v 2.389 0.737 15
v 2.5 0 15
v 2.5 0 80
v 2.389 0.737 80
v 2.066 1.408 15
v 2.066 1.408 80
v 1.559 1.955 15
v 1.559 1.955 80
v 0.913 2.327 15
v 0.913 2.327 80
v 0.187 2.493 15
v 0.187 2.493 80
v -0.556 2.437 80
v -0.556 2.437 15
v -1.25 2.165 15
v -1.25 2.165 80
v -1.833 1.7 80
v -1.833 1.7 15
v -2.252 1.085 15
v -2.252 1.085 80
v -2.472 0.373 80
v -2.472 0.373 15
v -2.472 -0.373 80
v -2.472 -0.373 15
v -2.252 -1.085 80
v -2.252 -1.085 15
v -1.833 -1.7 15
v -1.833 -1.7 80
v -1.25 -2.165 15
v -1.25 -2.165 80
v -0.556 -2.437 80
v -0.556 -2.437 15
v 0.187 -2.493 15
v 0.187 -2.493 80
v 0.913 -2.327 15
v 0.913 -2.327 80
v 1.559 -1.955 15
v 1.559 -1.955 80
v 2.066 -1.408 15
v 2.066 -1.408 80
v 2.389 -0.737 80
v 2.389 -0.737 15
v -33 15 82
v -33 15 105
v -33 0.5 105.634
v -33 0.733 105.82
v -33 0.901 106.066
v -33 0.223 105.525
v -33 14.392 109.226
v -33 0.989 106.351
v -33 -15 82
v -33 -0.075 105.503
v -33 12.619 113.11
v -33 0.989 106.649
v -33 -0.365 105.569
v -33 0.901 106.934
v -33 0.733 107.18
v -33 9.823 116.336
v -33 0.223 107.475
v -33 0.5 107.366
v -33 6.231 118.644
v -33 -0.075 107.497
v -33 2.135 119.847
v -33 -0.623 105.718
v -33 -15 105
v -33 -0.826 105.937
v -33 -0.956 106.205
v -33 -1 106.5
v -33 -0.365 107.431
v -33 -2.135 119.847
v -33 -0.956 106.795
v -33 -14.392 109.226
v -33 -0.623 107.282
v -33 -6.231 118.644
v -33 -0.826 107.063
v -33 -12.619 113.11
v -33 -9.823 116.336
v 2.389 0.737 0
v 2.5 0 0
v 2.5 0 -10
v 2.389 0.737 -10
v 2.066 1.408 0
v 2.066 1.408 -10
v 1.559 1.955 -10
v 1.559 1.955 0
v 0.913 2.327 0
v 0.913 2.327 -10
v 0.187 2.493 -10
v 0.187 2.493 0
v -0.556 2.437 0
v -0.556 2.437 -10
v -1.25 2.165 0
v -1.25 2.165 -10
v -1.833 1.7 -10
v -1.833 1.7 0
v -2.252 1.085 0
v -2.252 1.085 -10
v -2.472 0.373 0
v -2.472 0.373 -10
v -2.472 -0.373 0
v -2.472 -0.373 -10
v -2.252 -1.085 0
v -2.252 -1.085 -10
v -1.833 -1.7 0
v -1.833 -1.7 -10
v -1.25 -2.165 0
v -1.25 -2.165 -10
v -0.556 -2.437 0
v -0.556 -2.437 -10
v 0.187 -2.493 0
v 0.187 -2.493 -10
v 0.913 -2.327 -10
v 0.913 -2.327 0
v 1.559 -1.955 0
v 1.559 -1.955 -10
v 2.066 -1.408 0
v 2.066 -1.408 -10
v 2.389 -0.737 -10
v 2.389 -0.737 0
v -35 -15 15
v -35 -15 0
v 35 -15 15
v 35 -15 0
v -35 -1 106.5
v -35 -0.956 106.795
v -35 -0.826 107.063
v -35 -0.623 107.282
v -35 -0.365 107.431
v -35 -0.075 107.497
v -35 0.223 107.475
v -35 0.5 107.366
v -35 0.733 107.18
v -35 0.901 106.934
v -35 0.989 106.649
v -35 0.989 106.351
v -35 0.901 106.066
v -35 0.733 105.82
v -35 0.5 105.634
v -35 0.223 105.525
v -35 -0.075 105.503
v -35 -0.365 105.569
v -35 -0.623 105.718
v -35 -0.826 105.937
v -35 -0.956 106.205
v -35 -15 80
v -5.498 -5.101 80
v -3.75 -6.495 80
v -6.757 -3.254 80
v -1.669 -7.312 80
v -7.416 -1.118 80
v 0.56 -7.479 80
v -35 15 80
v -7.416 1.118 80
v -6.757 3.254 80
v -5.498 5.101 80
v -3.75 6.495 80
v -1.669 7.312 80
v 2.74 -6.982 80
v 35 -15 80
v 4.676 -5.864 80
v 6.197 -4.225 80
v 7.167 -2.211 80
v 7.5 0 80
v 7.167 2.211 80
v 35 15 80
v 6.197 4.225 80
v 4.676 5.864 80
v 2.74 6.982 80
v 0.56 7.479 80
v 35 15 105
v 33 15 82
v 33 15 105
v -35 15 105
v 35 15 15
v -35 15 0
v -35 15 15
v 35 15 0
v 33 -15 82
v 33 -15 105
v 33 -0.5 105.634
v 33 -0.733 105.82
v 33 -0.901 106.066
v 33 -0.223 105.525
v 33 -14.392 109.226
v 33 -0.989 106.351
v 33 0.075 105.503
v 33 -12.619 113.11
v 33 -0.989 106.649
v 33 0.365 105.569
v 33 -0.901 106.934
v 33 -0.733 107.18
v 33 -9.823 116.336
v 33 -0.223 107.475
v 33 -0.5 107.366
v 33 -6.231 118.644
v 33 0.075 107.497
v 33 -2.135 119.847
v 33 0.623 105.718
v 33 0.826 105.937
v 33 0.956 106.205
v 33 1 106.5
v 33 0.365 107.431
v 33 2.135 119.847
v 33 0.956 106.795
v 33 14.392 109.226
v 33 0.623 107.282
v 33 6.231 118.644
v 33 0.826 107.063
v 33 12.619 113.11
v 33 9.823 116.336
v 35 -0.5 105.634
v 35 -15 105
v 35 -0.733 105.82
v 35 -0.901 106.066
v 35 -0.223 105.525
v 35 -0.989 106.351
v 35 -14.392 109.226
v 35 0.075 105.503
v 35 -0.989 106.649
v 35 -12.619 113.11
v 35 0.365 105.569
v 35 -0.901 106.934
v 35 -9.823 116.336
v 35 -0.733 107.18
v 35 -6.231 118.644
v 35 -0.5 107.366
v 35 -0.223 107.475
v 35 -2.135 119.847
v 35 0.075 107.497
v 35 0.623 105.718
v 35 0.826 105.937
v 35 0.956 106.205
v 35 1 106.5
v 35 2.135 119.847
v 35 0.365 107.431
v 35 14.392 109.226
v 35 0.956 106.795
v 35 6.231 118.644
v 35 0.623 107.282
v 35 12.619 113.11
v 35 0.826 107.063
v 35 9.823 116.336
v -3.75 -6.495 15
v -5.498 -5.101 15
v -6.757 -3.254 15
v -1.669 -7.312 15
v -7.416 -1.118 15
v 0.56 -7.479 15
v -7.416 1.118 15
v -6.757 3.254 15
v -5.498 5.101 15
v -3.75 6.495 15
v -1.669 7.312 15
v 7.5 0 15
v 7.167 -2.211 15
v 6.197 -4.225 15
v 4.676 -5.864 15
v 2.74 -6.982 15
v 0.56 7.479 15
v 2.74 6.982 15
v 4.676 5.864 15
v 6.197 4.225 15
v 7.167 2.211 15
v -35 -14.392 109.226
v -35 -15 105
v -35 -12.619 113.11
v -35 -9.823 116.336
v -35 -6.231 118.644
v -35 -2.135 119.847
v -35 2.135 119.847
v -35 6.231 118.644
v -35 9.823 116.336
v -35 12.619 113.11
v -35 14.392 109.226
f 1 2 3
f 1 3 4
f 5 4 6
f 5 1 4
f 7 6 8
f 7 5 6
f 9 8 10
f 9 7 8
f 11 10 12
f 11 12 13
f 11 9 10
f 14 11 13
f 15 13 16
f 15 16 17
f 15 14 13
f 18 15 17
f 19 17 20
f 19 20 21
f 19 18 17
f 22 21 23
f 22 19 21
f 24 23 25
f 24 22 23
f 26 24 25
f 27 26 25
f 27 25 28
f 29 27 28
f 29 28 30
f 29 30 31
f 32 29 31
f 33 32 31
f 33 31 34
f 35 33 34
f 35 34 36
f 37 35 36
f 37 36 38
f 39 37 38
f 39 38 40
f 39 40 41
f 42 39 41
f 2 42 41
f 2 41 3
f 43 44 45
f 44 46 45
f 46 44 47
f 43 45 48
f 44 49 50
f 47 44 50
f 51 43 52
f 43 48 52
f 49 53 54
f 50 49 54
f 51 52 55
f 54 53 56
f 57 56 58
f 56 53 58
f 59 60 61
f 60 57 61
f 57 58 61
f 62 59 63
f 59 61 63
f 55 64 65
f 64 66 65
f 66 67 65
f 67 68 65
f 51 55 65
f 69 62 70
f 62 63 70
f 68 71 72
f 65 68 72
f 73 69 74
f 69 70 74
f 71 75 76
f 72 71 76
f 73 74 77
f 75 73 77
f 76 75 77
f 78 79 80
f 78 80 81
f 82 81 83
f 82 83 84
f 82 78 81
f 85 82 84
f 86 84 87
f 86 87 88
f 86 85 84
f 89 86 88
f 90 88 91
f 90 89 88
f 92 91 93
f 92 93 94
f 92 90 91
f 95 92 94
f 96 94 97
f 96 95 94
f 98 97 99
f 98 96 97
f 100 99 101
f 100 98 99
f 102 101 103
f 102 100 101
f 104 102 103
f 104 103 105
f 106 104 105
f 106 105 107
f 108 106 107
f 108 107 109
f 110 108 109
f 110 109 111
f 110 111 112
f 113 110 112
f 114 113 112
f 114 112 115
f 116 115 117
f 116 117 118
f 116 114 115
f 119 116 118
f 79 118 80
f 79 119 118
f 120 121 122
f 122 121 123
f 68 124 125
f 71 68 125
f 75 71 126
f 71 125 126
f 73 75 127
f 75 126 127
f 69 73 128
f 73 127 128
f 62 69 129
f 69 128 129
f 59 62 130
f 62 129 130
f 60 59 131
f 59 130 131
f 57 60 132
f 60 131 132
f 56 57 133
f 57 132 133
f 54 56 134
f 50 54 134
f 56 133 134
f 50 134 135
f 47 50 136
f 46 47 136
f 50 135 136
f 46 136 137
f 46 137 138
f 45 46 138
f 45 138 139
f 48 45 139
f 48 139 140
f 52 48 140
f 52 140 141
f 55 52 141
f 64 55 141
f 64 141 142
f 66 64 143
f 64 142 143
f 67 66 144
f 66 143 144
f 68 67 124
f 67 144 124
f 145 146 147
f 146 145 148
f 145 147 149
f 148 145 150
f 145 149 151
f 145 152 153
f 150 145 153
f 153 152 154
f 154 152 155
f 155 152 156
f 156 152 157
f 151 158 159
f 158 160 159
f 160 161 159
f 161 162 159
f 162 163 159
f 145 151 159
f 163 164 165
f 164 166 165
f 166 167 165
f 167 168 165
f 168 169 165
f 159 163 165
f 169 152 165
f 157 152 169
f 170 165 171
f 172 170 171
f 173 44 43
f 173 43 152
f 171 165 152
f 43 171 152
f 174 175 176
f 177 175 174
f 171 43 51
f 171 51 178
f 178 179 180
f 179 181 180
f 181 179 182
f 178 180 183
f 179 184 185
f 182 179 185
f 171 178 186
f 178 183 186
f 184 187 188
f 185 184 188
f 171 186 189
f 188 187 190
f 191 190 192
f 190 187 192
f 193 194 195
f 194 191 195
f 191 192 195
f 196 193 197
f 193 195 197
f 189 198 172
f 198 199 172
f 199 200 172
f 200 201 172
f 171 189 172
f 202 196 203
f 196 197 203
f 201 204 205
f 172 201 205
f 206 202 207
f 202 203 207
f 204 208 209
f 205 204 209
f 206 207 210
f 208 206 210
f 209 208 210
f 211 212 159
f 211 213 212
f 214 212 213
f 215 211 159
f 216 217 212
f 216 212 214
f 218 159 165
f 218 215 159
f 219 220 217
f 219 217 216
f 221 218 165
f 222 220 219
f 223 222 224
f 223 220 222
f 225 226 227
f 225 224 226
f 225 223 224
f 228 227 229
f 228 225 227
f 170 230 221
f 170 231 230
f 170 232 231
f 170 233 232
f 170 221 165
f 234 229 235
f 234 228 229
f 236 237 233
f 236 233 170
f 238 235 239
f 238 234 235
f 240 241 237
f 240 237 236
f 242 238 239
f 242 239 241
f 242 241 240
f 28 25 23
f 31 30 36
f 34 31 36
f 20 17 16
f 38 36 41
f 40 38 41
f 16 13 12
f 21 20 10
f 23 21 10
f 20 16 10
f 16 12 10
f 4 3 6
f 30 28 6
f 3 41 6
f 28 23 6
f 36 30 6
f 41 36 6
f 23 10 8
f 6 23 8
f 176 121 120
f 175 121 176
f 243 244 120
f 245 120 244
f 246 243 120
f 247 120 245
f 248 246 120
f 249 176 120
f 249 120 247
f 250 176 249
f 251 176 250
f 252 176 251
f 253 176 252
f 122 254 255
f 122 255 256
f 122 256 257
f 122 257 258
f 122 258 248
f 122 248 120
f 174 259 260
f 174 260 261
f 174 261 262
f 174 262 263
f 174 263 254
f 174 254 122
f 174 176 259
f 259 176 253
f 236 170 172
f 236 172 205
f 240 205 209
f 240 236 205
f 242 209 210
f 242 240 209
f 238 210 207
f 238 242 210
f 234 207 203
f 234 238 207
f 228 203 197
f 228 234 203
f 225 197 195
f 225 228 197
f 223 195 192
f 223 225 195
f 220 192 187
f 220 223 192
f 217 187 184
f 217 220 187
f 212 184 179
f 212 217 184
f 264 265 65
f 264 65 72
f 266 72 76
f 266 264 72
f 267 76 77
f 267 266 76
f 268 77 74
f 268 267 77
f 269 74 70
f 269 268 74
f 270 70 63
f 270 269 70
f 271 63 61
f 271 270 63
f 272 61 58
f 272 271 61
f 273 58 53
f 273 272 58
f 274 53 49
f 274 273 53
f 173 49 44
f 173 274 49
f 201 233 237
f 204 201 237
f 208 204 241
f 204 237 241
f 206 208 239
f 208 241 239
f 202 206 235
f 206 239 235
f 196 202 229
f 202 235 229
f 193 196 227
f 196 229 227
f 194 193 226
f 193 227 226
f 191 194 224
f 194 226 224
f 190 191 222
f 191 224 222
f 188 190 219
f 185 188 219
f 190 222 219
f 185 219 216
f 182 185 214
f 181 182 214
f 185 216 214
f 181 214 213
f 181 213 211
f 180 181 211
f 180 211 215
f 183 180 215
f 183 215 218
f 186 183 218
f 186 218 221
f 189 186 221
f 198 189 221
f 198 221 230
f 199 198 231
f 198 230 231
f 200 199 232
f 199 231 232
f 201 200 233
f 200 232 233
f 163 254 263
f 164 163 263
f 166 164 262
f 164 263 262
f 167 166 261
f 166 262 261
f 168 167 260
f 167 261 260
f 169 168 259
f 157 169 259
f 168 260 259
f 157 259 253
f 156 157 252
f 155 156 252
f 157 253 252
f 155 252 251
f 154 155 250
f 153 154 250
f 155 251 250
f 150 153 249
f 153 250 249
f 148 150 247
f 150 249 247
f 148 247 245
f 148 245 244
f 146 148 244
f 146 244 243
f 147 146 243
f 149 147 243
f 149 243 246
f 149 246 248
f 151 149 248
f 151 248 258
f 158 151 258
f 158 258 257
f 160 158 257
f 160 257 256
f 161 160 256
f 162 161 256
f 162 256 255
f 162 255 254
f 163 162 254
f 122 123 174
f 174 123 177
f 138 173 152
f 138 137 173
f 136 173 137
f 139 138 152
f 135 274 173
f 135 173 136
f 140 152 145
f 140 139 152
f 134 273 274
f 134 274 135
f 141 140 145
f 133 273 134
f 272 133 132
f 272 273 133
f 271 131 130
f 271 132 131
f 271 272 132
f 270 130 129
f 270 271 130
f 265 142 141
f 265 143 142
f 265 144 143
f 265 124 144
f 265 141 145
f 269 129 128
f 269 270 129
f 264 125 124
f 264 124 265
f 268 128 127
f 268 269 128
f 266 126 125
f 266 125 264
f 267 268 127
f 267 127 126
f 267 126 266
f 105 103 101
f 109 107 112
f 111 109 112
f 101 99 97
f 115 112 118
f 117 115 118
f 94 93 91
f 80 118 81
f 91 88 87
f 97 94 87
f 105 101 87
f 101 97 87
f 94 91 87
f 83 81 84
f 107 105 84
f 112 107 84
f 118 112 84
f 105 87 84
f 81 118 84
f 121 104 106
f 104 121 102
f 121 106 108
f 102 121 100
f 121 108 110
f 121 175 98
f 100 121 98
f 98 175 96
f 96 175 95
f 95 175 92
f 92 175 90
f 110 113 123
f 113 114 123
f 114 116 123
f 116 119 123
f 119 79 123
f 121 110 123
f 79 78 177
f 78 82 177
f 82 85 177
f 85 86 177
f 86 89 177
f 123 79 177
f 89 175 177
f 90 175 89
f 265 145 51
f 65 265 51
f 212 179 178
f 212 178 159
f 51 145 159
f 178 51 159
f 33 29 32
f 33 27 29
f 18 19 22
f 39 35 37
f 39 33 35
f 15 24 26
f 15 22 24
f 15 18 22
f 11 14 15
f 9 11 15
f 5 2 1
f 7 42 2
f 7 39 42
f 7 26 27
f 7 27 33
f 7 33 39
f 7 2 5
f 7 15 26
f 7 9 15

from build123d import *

# Parameters (mm, degrees)
F0_W      = 70
F0_H      = 30
F0_R      = 7.5
F0_R_2    = 2.5
F1_DEPTH  = 15
F2_DEPTH  = 10
F3_DEPTH  = 80
F4_W      = 66
F4_H      = 30
F4_R      = 7.5
F4_R_2    = 2.5
F4_W_2    = 2
F5_DEPTH  = 2
F6_DEPTH  = 25
F7_R      = 1
F8_DEPTH  = 2
F9_R      = 1
F10_DEPTH = 2


with BuildPart() as f1:
    # F0 (on Top) → F1 (new body)
    with BuildSketch(Plane.XY):
        Rectangle(F0_W, F0_H)
        Circle(F0_R, mode=Mode.SUBTRACT)
        Circle(F0_R)
        Circle(F0_R_2, mode=Mode.SUBTRACT)
        Circle(F0_R_2)
    extrude(amount=F1_DEPTH)

    # F0 (on Top) → F2 (join)
    with BuildSketch(Plane.XY):
        Circle(F0_R_2)
    extrude(amount=-F2_DEPTH)

    # F0 (on Top) → F3 (join)
    with BuildSketch(Plane.XY):
        Circle(F0_R)
        Circle(F0_R_2, mode=Mode.SUBTRACT)
    extrude(amount=F3_DEPTH)

    # F4 (on face) → F5 (join)
    with BuildSketch(Plane.XY.offset(80)):
        Rectangle(F4_W, F4_H)
        Circle(F4_R, mode=Mode.SUBTRACT)
        Circle(F4_R)
        Circle(F4_R_2, mode=Mode.SUBTRACT)
        Circle(F4_R_2)
        with Locations((-34, 0)):
            Rectangle(F4_W_2, F4_H)
        with Locations((34, 0)):
            Rectangle(F4_W_2, F4_H)
    extrude(amount=F5_DEPTH)

    # F4 (on face) → F6 (join)
    with BuildSketch(Plane.XY.offset(80)):
        with Locations((-34, 0)):
            Rectangle(F4_W_2, F4_H)
        with Locations((34, 0)):
            Rectangle(F4_W_2, F4_H)
    extrude(amount=F6_DEPTH)

    # F7 (on face) → F8 (join)
    with BuildSketch(Plane(origin=(-35, 0, 0), x_dir=(0, -1, 0), z_dir=(-1, 0, 0))):
        with BuildLine():
            Line((-15, 105), (15, 105))
            ThreePointArc((15, 105), (0, 120), (-15, 105))
        make_face()
        with Locations((0, 106.5)):
            Circle(F7_R, mode=Mode.SUBTRACT)
    extrude(amount=-F8_DEPTH)

    # F9 (on face) → F10 (join)
    with BuildSketch(Plane.YZ.offset(35)):
        with BuildLine():
            Line((-15, 105), (15, 105))
            ThreePointArc((15, 105), (0, 120), (-15, 105))
        make_face()
        with Locations((0, 106.5)):
            Circle(F9_R, mode=Mode.SUBTRACT)
    extrude(amount=-F10_DEPTH)


solid = f1.part
